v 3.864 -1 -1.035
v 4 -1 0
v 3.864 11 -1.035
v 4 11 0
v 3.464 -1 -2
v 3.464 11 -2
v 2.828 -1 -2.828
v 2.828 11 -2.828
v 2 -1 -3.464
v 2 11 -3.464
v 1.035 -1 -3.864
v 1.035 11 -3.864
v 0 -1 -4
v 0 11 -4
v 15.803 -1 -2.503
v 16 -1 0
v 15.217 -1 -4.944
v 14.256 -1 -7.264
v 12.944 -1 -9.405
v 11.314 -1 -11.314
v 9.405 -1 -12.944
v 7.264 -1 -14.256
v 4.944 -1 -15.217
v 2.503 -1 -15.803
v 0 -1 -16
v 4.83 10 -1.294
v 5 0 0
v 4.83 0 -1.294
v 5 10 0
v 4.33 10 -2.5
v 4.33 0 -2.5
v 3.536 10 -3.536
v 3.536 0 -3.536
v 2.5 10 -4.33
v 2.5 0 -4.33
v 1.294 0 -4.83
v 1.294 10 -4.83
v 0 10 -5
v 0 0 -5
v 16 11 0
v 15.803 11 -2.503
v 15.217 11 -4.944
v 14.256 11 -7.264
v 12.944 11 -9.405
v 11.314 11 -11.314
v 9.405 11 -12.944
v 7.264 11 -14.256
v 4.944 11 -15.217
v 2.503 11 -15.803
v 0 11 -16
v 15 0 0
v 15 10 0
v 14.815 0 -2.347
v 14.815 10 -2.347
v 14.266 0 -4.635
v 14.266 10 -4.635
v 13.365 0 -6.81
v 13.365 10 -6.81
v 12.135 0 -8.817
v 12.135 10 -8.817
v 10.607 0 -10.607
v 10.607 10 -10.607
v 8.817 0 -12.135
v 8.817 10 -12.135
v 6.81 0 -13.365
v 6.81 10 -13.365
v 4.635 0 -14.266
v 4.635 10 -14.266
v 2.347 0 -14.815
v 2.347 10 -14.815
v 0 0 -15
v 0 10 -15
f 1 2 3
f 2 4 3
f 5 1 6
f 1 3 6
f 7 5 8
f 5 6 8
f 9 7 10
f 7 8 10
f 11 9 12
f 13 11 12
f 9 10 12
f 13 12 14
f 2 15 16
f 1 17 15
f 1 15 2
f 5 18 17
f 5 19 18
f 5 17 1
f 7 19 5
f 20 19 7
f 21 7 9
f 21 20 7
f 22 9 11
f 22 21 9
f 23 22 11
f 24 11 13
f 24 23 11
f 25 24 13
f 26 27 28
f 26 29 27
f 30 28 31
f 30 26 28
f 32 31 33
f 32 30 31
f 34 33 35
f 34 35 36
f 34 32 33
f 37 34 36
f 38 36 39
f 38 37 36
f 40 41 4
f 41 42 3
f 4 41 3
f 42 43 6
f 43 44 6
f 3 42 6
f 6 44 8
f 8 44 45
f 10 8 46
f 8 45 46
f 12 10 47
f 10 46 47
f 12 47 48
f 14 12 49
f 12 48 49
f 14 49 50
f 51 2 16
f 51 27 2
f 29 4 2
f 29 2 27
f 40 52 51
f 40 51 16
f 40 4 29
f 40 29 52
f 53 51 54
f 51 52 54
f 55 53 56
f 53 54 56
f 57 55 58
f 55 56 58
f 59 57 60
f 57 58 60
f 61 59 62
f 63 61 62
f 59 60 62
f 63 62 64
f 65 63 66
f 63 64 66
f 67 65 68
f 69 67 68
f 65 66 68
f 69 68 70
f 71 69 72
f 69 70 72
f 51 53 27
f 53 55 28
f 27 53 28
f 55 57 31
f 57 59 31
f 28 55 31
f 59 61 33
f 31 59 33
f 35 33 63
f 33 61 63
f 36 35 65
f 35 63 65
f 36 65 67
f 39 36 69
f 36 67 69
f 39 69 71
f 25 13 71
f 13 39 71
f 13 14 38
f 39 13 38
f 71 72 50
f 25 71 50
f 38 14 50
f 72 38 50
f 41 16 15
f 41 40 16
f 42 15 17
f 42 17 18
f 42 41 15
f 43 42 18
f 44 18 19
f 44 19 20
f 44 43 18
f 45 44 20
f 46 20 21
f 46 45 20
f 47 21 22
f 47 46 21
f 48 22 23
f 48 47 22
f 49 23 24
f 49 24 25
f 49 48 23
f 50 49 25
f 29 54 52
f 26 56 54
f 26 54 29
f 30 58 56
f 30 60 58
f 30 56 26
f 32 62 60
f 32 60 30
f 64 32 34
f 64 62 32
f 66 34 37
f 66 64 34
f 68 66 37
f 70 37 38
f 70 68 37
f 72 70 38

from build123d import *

# Parameters (mm, degrees)
SKETCH_1_W          = 12
SKETCH_1_H          = 12
SKETCH_1_W_2        = 10
SKETCH_1_H_2        = 10
THINREVOLVE90_ANGLE = 90


with BuildPart() as part:
    # 草图1 → ThinRevolve90 (revolve)
    with BuildSketch(Plane.XY):
        with Locations((10, 5)):
            Rectangle(SKETCH_1_W, SKETCH_1_H)
        with Locations((10, 5)):
            Rectangle(SKETCH_1_W_2, SKETCH_1_H_2, mode=Mode.SUBTRACT)
    revolve(axis=Axis((0, 0, 0), (0, 1, 0)), revolution_arc=THINREVOLVE90_ANGLE)


solid = part.part
